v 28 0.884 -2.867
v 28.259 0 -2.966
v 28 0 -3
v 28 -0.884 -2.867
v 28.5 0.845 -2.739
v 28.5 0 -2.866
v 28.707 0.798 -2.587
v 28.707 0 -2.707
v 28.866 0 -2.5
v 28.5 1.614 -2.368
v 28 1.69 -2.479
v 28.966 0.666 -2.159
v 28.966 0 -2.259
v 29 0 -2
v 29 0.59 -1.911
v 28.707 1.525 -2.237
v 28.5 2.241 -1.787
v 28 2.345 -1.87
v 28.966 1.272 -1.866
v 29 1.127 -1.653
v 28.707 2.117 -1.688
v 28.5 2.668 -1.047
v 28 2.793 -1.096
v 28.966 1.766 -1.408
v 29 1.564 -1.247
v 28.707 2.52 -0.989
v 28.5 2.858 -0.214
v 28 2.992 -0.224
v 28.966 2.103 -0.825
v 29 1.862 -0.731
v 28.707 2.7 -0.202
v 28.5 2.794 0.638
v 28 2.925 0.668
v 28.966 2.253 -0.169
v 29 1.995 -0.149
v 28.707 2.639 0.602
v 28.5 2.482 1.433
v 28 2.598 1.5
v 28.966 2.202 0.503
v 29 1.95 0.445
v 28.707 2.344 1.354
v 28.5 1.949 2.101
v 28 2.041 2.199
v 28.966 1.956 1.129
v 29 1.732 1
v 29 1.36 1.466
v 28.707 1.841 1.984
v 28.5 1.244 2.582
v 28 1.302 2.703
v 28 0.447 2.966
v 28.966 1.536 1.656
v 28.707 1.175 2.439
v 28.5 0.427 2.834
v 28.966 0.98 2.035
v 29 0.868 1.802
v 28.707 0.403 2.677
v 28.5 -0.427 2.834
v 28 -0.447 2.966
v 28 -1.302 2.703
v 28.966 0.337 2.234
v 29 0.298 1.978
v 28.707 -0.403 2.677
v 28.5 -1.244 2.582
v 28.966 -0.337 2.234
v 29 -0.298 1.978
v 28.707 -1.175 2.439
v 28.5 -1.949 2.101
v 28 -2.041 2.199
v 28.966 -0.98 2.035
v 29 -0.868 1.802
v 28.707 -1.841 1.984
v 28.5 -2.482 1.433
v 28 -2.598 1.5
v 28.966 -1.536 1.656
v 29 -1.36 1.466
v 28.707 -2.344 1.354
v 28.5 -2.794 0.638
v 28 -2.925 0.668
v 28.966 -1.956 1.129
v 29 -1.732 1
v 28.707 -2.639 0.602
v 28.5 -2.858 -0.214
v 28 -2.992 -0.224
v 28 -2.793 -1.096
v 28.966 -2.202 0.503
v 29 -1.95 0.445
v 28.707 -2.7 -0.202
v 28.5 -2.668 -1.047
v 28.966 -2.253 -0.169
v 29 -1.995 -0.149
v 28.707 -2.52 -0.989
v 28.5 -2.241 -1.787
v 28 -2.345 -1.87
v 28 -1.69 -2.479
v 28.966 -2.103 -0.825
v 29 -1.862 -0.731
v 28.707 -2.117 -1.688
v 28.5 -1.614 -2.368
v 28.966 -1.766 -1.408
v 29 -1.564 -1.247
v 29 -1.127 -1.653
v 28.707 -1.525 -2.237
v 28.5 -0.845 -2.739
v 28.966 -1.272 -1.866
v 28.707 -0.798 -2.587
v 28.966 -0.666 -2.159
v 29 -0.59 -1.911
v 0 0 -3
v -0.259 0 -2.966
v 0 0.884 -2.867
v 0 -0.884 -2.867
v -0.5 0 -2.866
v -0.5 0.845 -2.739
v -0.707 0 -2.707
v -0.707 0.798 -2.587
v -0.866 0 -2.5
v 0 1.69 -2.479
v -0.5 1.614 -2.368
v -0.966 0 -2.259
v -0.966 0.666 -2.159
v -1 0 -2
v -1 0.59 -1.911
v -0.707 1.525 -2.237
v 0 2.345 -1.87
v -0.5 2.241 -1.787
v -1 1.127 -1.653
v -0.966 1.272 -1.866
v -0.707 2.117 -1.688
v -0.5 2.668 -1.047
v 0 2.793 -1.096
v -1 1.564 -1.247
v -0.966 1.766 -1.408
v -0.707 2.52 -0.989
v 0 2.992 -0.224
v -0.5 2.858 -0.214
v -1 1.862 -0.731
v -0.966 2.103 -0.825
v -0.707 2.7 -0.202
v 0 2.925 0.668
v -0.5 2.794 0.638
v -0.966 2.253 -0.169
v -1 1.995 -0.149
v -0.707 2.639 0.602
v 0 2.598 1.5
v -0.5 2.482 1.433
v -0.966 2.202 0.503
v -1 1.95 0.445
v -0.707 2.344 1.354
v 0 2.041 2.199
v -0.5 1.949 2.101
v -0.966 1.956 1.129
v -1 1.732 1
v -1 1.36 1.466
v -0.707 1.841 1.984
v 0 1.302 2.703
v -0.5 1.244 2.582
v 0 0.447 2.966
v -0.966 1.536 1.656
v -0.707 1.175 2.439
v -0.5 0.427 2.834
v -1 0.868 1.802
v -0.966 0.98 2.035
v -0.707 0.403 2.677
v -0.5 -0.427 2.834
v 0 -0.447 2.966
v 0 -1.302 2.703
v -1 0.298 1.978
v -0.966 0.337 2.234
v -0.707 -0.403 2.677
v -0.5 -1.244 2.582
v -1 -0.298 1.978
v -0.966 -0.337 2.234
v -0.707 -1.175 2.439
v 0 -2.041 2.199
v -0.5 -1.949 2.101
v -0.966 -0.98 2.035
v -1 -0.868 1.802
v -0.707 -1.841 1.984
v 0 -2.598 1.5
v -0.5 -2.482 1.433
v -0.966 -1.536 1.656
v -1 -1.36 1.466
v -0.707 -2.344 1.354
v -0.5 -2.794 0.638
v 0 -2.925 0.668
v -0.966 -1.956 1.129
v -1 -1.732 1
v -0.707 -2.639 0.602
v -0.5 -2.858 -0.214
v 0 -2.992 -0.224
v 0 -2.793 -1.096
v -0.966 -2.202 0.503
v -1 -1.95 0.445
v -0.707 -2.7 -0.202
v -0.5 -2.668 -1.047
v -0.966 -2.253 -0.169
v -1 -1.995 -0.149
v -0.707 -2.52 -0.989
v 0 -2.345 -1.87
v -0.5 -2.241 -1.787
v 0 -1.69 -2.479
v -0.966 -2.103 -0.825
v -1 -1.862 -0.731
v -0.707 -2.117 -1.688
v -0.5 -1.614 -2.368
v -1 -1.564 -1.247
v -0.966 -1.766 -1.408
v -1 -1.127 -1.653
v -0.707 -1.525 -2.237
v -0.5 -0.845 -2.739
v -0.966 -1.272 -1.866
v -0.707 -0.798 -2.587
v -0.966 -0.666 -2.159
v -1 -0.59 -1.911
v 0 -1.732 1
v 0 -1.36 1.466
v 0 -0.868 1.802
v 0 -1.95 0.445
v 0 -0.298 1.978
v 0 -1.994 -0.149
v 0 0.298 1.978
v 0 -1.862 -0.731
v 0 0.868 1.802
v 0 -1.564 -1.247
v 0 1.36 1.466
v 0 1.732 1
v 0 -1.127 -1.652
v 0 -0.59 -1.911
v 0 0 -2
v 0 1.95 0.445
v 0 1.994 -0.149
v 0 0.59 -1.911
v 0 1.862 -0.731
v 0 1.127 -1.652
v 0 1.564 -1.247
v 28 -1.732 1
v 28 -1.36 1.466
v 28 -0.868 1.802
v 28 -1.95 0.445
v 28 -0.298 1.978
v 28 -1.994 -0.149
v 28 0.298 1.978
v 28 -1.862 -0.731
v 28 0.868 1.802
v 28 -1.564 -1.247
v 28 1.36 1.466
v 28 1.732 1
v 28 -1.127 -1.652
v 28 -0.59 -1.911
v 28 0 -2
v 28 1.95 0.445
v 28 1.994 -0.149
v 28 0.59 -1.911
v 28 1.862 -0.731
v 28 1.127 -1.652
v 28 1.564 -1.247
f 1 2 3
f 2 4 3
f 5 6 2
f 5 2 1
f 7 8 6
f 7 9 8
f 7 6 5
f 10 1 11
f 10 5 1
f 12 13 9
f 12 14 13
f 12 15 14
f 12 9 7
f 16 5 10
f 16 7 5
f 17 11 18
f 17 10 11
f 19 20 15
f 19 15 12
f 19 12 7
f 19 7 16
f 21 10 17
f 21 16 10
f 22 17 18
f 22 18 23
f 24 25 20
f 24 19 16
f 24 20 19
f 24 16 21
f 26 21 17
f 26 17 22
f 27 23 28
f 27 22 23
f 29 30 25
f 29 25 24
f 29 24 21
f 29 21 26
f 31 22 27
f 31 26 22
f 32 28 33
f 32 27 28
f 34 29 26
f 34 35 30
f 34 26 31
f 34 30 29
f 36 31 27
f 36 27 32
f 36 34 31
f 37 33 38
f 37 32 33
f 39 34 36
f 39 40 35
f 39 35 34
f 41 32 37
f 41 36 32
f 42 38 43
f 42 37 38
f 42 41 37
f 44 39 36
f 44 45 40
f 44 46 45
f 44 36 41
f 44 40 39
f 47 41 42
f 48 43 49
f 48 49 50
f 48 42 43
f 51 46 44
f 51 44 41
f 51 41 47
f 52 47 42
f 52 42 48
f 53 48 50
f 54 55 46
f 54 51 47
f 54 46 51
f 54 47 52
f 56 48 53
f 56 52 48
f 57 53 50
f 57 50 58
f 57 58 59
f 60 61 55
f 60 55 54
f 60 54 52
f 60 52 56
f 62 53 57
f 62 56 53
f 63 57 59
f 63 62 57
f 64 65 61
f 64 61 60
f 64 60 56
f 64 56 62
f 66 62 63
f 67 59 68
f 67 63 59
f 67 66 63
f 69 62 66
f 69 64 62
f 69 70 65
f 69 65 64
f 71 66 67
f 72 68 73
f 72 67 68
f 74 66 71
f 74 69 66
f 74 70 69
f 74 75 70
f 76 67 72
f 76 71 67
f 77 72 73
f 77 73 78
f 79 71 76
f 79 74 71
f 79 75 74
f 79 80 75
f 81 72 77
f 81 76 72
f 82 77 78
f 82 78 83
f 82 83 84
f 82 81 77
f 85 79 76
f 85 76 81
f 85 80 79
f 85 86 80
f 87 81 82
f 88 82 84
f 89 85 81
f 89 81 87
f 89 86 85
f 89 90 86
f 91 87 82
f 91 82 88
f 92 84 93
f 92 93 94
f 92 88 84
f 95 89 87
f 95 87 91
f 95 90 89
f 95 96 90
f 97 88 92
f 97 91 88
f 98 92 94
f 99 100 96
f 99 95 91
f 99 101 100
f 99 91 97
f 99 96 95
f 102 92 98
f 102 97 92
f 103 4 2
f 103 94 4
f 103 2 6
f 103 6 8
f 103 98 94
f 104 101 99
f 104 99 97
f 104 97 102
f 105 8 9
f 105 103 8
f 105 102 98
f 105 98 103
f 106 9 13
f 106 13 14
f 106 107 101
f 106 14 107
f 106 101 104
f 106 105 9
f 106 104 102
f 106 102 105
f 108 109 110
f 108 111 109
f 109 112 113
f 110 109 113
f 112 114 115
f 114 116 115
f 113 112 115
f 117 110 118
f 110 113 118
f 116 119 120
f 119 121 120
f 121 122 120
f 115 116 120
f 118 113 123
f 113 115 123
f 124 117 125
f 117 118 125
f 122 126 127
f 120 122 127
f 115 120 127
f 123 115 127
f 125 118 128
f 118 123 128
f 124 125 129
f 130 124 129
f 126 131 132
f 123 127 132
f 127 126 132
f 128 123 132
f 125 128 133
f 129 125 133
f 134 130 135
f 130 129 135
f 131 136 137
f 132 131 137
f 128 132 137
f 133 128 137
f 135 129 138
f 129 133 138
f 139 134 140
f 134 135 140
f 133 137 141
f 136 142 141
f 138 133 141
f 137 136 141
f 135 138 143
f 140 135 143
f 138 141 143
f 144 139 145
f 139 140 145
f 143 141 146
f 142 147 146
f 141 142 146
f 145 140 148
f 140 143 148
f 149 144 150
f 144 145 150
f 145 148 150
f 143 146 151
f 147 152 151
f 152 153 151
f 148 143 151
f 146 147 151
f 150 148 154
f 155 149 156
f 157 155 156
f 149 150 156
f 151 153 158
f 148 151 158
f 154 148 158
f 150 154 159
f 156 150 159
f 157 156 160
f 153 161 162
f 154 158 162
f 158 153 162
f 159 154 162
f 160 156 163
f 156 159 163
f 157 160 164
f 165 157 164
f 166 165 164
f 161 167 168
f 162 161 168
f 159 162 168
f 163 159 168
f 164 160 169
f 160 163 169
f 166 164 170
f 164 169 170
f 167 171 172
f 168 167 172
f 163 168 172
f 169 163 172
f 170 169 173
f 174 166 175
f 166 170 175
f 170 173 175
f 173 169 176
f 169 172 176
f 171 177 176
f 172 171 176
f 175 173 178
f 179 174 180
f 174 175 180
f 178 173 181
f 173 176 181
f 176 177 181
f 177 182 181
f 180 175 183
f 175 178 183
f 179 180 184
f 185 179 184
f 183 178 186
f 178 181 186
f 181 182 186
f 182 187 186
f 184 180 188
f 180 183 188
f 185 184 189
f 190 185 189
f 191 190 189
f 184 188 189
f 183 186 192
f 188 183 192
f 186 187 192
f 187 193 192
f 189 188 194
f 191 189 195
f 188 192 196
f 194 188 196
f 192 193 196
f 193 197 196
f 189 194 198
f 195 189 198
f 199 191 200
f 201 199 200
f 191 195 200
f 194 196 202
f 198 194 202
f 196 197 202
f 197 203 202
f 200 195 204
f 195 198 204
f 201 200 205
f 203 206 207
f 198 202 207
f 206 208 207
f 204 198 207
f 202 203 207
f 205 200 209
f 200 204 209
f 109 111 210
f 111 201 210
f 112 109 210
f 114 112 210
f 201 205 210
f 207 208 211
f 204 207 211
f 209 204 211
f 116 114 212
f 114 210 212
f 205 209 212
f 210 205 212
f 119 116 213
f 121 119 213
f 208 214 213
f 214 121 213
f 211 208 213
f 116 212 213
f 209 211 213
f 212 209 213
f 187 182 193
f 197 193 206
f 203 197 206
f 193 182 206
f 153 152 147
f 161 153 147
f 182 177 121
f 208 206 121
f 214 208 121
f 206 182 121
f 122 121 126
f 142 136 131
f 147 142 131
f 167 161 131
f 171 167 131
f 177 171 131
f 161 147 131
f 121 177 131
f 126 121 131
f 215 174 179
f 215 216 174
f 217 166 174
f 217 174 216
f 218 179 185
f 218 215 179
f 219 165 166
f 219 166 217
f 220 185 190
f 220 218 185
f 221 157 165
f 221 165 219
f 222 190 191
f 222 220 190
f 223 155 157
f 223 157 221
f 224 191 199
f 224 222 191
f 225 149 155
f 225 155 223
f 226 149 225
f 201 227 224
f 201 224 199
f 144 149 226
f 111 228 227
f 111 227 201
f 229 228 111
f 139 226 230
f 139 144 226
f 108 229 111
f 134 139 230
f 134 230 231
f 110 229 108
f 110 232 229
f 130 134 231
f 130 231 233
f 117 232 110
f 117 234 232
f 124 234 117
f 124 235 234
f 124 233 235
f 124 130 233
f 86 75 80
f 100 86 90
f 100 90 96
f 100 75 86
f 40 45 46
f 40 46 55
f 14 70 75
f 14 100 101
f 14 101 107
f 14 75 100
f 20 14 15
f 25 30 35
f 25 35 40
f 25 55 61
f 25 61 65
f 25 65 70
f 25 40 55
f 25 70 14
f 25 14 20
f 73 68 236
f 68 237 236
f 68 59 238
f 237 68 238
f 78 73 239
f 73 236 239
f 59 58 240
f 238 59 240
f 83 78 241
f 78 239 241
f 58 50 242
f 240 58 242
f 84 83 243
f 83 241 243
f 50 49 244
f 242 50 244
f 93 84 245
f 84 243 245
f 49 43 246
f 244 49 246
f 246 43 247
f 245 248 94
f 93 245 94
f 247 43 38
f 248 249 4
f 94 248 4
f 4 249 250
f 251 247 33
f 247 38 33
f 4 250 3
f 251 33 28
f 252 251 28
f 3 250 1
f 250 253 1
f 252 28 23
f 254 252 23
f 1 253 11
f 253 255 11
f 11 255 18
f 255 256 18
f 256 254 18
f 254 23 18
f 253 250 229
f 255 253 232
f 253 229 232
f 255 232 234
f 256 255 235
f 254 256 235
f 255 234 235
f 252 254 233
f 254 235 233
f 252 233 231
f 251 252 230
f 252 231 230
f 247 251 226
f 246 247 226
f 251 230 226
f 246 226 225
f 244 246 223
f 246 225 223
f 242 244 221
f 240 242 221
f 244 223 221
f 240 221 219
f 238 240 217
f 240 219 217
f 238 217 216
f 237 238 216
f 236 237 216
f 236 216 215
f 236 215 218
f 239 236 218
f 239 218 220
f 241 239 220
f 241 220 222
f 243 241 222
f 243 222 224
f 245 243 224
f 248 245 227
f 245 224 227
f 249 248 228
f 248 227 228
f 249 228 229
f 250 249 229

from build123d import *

# Parameters (mm, degrees)
SKETCH2_R            = 2
BOSS_EXTRUDE1_DEPTH  = 28
SKETCH3_R            = 3
BOSS_EXTRUDE2_DEPTH  = 1
FILLET1_R            = 1
FILLET1_OF_MIRROR1_R = 1


with BuildPart() as part:
    # Sketch2 → Boss-Extrude1 (new body)
    with BuildSketch(Plane(origin=(0, 0, 0), x_dir=(0, 0, -1), z_dir=(1, 0, 0))):
        Circle(SKETCH2_R)
    extrude(amount=BOSS_EXTRUDE1_DEPTH)

    # Sketch3 → Boss-Extrude2 (add)
    with BuildSketch(Plane(origin=(28, 0, 0), x_dir=(0, 0, -1), z_dir=(1, 0, 0))):
        Circle(SKETCH3_R)
    boss_extrude2 = extrude(amount=BOSS_EXTRUDE2_DEPTH)

    # Fillet1
    fillet1_edges = [part.edges().sort_by_distance(p)[0] for p in [
        (29, 0, 3),
    ]]
    fillet(fillet1_edges, radius=FILLET1_R - 0.0001)  # a hair under: the kernel refuses the full size

    # Mirror1: Boss-Extrude2 across plane
    add(boss_extrude2.mirror(Plane.ZY.offset(-14)))

    # Fillet1 of Mirror1
    fillet1_of_mirror1_edges = [part.edges().sort_by_distance(p)[0] for p in [
        (-1, 0, 3),
    ]]
    fillet(fillet1_of_mirror1_edges, radius=FILLET1_OF_MIRROR1_R - 0.0001)  # a hair under: the kernel refuses the full size


solid = part.part
